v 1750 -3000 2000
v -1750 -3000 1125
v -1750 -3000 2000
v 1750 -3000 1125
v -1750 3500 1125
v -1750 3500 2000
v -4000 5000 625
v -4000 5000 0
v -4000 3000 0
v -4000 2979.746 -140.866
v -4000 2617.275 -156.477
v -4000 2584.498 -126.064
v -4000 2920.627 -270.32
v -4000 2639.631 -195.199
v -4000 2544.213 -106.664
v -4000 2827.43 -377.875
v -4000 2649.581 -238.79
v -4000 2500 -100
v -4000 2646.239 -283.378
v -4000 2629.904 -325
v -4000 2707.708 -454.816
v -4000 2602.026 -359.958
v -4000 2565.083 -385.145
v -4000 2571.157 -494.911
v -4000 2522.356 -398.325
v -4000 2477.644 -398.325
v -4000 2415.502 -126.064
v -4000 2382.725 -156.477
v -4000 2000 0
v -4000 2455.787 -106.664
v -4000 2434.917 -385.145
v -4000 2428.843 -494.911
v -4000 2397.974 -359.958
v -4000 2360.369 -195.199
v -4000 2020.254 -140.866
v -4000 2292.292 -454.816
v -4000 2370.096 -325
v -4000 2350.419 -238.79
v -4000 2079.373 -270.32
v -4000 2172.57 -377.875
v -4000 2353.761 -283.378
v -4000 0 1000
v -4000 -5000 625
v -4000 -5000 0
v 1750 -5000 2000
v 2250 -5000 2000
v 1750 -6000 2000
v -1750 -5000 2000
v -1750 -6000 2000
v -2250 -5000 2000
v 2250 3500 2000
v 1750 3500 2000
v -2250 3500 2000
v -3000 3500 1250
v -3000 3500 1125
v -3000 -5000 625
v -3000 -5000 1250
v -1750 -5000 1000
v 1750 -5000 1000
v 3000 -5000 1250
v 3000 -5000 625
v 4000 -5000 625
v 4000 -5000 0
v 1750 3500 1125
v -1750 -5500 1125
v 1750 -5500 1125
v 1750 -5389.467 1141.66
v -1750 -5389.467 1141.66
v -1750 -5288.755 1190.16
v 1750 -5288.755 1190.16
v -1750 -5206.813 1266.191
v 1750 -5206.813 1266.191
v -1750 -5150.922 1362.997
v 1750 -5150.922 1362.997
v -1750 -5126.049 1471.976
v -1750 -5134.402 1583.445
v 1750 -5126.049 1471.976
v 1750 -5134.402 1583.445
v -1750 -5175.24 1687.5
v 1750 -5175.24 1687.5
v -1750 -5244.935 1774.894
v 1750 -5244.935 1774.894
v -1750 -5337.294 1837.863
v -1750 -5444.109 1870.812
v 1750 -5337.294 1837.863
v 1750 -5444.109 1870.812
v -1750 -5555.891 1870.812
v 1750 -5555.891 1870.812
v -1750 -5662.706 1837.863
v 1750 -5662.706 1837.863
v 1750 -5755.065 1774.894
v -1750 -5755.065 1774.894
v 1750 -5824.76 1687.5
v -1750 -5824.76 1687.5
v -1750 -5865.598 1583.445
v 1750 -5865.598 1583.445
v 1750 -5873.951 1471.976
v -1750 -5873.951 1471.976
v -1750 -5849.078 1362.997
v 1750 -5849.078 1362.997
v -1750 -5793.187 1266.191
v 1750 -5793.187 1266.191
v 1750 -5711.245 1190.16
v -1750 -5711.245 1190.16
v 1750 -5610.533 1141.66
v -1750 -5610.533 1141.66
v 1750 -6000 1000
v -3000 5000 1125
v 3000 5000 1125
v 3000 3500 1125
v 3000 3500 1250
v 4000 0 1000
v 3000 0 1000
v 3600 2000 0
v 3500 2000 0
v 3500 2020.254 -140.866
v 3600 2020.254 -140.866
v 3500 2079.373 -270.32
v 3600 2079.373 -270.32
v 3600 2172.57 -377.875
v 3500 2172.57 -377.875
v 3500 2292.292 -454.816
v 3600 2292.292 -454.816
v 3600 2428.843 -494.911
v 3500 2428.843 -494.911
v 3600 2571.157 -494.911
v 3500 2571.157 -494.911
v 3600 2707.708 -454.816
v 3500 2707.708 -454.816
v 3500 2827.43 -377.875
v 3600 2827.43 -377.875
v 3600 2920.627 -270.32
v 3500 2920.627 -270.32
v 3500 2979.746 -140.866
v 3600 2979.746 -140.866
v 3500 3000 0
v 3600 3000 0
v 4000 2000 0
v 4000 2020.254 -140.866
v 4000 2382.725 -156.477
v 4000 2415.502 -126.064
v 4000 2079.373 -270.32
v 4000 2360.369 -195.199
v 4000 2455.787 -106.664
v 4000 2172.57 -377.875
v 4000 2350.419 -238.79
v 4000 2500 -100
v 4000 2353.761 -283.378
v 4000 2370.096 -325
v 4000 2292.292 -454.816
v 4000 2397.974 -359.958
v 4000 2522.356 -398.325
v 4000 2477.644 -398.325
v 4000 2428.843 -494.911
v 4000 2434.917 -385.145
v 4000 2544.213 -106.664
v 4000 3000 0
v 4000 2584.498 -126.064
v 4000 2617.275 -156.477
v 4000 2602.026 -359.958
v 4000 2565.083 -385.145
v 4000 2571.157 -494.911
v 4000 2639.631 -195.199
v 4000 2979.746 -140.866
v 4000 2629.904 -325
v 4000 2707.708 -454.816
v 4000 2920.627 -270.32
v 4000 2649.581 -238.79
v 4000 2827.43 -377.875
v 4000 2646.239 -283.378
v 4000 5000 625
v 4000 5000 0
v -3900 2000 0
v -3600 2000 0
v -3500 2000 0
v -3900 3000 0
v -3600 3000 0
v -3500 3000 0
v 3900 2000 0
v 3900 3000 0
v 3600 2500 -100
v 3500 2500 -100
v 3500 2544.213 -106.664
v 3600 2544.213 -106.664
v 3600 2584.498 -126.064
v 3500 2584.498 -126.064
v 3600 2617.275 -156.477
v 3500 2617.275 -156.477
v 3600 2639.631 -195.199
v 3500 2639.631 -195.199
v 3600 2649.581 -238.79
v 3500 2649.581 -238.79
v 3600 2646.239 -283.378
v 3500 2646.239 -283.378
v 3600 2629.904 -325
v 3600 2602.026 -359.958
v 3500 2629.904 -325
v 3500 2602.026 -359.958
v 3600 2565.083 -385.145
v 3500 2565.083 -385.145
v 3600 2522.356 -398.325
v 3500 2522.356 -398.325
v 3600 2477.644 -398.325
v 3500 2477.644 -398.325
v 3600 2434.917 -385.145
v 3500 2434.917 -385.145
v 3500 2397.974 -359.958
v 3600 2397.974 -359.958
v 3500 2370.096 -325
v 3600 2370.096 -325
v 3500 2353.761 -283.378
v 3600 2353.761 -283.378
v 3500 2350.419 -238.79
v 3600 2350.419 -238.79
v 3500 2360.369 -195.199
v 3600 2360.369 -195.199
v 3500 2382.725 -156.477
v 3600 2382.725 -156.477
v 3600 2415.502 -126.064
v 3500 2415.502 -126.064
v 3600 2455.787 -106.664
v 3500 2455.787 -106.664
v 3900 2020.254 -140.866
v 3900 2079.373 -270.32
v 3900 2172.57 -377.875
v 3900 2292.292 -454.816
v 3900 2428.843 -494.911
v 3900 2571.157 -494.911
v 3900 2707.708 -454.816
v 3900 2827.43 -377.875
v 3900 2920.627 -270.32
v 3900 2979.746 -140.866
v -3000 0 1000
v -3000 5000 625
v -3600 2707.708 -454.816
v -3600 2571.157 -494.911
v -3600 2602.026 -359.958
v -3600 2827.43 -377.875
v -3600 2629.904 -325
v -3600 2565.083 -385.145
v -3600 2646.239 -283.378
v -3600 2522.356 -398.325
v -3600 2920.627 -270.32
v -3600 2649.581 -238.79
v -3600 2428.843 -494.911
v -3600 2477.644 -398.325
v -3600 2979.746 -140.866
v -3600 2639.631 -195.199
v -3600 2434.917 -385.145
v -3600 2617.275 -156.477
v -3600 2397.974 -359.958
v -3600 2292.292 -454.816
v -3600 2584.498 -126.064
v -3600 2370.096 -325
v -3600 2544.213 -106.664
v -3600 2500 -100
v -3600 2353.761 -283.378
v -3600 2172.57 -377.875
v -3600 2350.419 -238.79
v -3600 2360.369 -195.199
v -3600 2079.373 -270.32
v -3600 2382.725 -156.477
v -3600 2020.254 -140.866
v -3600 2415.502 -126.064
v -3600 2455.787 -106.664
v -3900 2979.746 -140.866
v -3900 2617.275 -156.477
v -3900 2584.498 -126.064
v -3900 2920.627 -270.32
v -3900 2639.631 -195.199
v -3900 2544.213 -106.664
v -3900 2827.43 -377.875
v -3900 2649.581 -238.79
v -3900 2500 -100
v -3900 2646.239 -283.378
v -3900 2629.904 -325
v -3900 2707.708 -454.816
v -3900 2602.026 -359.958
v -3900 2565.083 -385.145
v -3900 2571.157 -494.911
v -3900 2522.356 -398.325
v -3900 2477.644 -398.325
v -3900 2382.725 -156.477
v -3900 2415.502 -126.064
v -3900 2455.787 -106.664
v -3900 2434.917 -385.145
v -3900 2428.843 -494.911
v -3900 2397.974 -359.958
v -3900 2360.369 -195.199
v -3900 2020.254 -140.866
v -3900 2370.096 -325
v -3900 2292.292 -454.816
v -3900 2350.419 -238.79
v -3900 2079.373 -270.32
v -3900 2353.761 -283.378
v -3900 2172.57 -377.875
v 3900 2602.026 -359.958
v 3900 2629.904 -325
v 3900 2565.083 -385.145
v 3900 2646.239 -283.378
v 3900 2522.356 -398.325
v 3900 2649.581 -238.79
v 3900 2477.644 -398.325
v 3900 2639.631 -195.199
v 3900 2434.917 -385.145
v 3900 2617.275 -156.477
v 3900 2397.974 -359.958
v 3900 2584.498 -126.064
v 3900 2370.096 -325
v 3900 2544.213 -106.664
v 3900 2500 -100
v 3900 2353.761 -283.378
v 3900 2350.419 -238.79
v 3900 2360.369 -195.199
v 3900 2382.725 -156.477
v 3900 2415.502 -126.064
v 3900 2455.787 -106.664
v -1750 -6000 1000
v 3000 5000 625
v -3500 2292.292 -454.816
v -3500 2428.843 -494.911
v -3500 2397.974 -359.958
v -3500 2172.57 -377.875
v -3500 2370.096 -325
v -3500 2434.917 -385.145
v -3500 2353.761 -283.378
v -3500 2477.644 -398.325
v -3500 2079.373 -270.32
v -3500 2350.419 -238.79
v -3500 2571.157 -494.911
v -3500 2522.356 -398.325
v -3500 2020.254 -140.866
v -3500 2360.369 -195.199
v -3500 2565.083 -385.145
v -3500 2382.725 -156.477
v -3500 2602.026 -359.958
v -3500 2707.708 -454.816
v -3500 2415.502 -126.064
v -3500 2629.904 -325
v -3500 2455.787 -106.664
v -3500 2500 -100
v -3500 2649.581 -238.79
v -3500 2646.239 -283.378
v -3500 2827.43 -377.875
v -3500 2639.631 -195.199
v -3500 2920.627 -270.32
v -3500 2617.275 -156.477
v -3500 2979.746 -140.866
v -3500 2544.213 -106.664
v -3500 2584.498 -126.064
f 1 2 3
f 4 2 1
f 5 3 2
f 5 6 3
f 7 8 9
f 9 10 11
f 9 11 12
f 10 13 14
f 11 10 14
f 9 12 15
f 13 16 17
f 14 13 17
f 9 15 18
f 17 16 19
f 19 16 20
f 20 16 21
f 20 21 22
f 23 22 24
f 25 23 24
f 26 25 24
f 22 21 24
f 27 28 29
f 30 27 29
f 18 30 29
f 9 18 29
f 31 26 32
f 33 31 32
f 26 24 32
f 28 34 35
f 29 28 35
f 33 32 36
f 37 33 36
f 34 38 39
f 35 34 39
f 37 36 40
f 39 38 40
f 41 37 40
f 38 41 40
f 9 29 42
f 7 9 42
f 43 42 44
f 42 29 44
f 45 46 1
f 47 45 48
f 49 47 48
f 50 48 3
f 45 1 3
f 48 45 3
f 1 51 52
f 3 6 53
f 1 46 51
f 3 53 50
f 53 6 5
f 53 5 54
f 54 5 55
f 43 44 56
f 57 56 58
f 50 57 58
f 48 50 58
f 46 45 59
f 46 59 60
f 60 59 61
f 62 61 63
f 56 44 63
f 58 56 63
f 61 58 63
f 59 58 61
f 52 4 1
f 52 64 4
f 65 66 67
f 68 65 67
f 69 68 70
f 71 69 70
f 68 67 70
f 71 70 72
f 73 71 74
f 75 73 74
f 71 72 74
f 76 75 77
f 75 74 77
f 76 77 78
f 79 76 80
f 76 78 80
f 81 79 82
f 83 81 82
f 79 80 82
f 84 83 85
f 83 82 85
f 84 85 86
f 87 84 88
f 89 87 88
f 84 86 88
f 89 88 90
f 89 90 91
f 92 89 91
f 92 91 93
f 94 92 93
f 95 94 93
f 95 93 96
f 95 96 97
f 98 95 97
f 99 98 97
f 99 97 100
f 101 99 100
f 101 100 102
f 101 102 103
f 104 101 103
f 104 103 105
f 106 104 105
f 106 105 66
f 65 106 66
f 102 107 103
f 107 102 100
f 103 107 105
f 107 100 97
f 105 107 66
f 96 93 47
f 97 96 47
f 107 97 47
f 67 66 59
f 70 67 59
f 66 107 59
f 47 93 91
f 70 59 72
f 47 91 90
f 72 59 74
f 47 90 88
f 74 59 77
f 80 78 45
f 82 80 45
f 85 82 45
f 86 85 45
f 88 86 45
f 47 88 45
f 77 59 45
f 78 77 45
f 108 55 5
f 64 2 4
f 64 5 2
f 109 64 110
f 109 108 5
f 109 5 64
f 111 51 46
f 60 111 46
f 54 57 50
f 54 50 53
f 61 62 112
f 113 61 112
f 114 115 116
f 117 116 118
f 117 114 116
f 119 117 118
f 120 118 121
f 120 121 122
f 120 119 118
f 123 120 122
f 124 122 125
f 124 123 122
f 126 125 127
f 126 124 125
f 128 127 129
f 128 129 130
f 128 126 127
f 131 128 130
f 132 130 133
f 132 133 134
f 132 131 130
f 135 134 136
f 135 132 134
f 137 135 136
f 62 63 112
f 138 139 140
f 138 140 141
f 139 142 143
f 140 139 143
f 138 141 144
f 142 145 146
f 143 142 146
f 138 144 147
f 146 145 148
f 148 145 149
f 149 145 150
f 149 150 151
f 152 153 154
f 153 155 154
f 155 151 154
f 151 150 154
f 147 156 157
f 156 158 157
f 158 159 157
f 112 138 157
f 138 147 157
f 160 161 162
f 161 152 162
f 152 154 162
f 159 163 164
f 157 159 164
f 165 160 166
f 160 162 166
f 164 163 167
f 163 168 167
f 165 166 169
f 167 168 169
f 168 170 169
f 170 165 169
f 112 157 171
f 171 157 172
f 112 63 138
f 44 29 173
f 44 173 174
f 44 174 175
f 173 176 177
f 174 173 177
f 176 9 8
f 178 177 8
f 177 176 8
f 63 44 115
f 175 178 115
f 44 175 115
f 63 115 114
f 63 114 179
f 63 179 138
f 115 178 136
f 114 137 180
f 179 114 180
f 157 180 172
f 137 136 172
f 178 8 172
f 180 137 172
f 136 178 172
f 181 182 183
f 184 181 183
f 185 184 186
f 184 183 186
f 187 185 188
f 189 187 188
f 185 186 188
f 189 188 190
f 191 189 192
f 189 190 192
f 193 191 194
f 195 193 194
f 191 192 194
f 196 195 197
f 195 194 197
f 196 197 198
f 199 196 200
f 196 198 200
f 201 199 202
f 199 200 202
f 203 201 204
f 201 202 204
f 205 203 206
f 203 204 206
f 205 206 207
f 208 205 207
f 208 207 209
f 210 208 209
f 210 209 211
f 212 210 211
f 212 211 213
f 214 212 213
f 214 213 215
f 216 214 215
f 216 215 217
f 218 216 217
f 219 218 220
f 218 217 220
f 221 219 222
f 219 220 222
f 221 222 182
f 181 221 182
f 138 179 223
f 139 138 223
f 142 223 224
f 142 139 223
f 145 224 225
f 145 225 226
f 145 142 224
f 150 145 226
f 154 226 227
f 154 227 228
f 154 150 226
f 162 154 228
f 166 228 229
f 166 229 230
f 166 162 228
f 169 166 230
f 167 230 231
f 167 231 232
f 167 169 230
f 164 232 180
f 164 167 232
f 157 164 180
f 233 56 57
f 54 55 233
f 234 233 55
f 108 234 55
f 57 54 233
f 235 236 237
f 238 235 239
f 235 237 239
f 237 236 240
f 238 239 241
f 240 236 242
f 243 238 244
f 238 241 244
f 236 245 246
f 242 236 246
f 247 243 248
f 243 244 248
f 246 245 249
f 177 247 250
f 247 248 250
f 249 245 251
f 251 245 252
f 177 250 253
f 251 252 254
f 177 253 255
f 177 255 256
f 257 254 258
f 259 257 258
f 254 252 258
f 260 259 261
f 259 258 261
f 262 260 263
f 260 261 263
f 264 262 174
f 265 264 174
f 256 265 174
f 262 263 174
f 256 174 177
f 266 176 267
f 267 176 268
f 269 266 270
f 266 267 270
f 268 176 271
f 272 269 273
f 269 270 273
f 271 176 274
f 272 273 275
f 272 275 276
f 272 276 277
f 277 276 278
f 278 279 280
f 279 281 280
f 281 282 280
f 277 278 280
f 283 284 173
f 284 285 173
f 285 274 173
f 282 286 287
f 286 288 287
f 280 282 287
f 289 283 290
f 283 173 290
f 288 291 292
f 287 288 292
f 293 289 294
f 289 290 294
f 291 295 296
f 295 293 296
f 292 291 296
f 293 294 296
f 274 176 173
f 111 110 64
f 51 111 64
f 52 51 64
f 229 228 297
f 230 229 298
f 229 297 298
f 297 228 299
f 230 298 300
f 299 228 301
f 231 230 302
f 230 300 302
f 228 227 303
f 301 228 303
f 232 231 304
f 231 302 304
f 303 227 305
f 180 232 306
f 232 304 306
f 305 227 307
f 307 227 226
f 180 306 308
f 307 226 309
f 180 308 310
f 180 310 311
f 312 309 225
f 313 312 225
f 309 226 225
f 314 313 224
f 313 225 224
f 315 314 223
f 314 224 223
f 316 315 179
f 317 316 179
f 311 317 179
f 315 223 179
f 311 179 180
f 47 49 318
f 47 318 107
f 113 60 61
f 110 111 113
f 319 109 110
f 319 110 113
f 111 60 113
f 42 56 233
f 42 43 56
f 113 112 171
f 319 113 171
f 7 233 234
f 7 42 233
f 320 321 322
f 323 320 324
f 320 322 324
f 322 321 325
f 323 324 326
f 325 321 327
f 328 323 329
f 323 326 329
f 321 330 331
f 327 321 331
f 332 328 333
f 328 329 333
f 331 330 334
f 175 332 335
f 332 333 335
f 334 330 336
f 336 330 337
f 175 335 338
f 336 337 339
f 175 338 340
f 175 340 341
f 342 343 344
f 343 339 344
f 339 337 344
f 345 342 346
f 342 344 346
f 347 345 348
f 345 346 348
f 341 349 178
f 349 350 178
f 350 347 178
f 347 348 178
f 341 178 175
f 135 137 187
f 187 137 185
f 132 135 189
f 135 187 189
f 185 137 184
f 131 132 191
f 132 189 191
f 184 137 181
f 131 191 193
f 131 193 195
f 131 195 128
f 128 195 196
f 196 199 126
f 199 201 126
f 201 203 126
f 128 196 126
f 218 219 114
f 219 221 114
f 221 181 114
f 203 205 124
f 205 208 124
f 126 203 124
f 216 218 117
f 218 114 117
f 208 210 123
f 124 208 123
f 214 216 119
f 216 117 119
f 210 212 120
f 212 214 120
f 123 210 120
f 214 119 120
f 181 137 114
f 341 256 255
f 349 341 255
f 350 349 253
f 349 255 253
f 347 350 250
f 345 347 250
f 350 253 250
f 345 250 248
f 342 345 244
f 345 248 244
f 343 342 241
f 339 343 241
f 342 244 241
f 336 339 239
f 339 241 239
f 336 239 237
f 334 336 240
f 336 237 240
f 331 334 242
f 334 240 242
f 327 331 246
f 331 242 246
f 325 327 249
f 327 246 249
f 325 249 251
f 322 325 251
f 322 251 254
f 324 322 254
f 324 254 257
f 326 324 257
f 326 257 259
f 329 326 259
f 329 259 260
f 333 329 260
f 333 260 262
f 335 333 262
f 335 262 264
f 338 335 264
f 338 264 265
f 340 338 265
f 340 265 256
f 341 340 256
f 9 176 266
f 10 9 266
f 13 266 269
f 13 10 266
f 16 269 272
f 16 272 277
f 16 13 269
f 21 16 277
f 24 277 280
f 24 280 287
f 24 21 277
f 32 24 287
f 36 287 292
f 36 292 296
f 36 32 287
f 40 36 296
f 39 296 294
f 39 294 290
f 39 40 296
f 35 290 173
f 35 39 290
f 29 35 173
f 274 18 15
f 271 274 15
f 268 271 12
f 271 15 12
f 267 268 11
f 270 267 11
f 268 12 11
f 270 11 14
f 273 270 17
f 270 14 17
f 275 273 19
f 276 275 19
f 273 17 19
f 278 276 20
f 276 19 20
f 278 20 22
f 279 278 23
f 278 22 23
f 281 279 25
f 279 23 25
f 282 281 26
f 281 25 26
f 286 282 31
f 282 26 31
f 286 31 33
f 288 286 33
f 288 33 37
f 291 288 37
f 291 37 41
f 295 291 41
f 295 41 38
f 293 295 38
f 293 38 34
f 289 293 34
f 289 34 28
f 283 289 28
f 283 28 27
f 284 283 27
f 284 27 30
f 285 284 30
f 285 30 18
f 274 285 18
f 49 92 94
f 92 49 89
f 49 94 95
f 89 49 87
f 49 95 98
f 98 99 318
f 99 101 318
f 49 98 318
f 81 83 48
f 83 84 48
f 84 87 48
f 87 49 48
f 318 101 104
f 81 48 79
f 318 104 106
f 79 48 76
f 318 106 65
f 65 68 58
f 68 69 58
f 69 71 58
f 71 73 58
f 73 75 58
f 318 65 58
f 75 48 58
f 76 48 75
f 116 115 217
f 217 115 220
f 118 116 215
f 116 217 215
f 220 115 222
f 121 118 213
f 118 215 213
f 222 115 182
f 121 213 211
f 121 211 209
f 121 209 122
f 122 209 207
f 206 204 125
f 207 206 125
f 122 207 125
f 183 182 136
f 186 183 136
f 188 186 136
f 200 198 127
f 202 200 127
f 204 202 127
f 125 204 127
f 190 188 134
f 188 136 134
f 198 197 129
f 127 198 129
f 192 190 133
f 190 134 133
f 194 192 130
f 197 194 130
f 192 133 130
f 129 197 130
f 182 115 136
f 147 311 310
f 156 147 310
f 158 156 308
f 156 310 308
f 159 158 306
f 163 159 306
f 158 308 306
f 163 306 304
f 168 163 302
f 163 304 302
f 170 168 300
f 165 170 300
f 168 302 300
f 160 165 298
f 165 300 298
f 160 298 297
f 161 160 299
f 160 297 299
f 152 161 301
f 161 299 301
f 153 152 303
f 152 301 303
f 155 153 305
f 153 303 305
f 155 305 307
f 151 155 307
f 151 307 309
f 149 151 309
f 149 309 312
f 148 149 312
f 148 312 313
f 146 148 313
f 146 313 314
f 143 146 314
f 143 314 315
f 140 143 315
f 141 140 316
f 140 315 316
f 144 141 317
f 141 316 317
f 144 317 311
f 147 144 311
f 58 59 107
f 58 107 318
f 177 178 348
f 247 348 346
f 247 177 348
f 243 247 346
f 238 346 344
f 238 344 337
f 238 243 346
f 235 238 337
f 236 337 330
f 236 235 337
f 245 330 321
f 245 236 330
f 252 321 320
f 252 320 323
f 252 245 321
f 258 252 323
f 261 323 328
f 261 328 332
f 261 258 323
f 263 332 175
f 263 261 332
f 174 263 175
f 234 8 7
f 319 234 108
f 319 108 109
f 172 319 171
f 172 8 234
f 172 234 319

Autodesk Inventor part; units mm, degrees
ref_plane "YZ Plane" through (0, 0, 0) normal (1, 0, 0) x (0, 1, 0)
sketch "Skizze1" plane through (0, 0, 0) normal (0, 0, 1) x (1, 0, 0)
  line L0 (-5600, 0) -> (5600, 0) construction
  line L1 (0, -7000) -> (0, 7000) construction
  line L2 (-4000, -5000) -> (4000, -5000)
  line L3 (4000, -5000) -> (4000, 5000)
  line L4 (4000, 5000) -> (-4000, 5000)
  line L5 (-4000, 5000) -> (-4000, -5000)
  line L6 (-4000, -5000) -> (4000, 5000) construction
  line L7 (4000, -5000) -> (-4000, 5000) construction
  point P0 (0, 0)
  dimension "d0" = 8000
  dimension "d1" = 10000
extrude "Extrusion1" add sketch "Skizze1" along normal blind 2000
sketch "Skizze2" plane through (-4000, 5000, 0) normal (0, 1, 0) x (1, 0, 0)
  line L0 (0, 0) -> (0, -1250)
  line L1 (0, -1250) -> (0, 0)
  line L2 (0, -1250) -> (1000, -1250)
  line L3 (8000, 0) -> (8000, -2000) construction
  line L4 (0, 0) -> (0, -2000) projected
  line L5 (1000, -1250) -> (1000, -2000)
  line L6 (8000, -2000) -> (0, -2000) construction
  line L7 (1000, -2000) -> (4000, -2000)
  line L8 (8000, 0) -> (8000, -1250)
  line L9 (8000, -1250) -> (7000, -1250)
  line L10 (7000, -1250) -> (7000, -2000)
  line L11 (8000, 0) -> (0, 0) projected
  line L12 (8000, 0) -> (0, 0)
  line L13 (7000, -2000) -> (4000, -2000)
  line L14 (0, -1250) -> (0, -2000)
  line L15 (0, -2000) -> (1000, -2000)
  line L16 (8000, -1250) -> (8000, -2000)
  line L17 (7000, -2000) -> (8000, -2000)
  line L18 (8000, -2000) -> (8000, -1250)
  point P0 (4000, 0)
  dimension "d4" = 750
  dimension "d5" = 1250
  dimension "d7" = 1000
extrude "Extrusion2" cut sketch "Skizze2" against normal through all contours L2 L5 L15 L4 | L16 L17 L10 L9
chamfer "Fase1" distance 750 angle 45 2 edges at (-3000, 0, 2000) (3000, 0, 2000)
sketch "Skizze3" plane through (4000, -5000, 0) normal (1, 0, 0) x (0, 0, -1)
  line L0 (0, 10000) -> (0, 8000)
  arc A0 (0, 7000) -> (0, 8000) centre (0, 7500) ccw
  line L1 (0, 7000) -> (0, 0)
  line L2 (0, 8000) -> (0, 7000)
  line L3 (0, 0) -> (0, 10000) projected
  point P0 (0, 5000)
  dimension "d16" = 2000
  dimension "d17" = 7000
extrude "Extrusion3" add sketch "Skizze3" against normal blind 500
sketch "Skizze4" plane through (0, 0, 0) normal (0, 0, -1) x (-1, 0, 0)
  point P0 (0, 0)
sketch "Skizze5" plane through (-4000, -5000, 0) normal (-1, 0, 0) x (0, 0, 1)
  line L0 (0, 8000) -> (0, 7000) projected
  arc A0 (0, 8000) -> (0, 7000) centre (0, 7500) ccw
  line L1 (0, 7000) -> (0, 8000)
  point P0 (0, 5000)
extrude "Extrusion4" add sketch "Skizze5" against normal blind 500
ref_plane "Arbeitsebene1" through (4000, 2000, 0) normal (0, 1, 0) x (1, 0, 0)
sketch "Skizze6" plane through (4000, 2000, 0) normal (0, 1, 0) x (1, 0, 0)
  line L0 (-100, 0) -> (-400, 0)
  line L1 (0, 0) -> (0, -1250) projected
  line L2 (-7900, 0) -> (-7600, 0)
  line L3 (0, 500) -> (-500, 500) projected
  line L4 (-100, 0) -> (-400, 0)
  line L5 (-400, 0) -> (-400, 500)
  line L6 (-400, 500) -> (-100, 500)
  line L7 (-100, 500) -> (-100, 0)
  line L8 (-8000, 500) -> (-7500, 500) construction
  line L9 (-7600, 0) -> (-7900, 0)
  line L10 (-7900, 0) -> (-7900, 500)
  line L11 (-7900, 500) -> (-7600, 500)
  line L12 (-7600, 500) -> (-7600, 0)
  point P0 (-4000, 0)
  point P1 (-8000, 0)
  dimension "d22" = 300
  dimension "d23" = 100
  dimension "d25" = 300
extrude "Extrusion5" cut sketch "Skizze6" along normal through all
sketch "Skizze7" plane through (0, 0, 2000) normal (0, 0, 1) x (1, 0, 0)
  line L0 (-2250, -5000) -> (2250, -5000) construction
  line L1 (-1750, 5000) -> (1750, 5000)
  line L2 (1750, 5000) -> (1750, -5000)
  line L3 (1750, -5000) -> (-1750, -5000)
  line L4 (-1750, -5000) -> (-1750, 5000)
  line L5 (-1750, 5000) -> (1750, -5000) construction
  line L6 (1750, 5000) -> (-1750, -5000) construction
  point P0 (0, 0)
  dimension "d28" = 3500
extrude "Extrusion6" cut sketch "Skizze7" against normal blind 1000
sketch "Skizze8" plane through (-4000, -5000, 1250) normal (-1, 0, 0) x (0, 0, 1)
  line L0 (-1250, 0) -> (0, 0) projected
  line L1 (-625, 0) -> (-250, 5000)
  line L2 (-250, 10000) -> (-250, 0) projected
  line L3 (-250, 5000) -> (-625, 10000)
  line L4 (-1250, 10000) -> (0, 10000) projected
  line L5 (-1250, 7000) -> (-1250, 0) construction
  line L6 (0, 10000) -> (0, 0) projected
  line L7 (-1250, 0) -> (0, 0)
  line L8 (750, 10000) -> (0, 10000) construction
  line L9 (0, 0) -> (0, 10000)
  line L10 (0, 10000) -> (-1250, 10000)
  line L11 (-250, 0) -> (-250, 10000)
  point P0 (-1250, 5000)
extrude "Extrusion7" cut sketch "Skizze8" against normal blind 1000 contours L1 L2 L0 | L3 L4 L2
sketch "Skizze9" plane through (-4000, -5000, 1250) normal (-1, 0, 0) x (0, 0, 1)
  line L0 (0, 0) -> (0, 10000) projected
  line L1 (-250, 0) -> (0, 0)
  line L2 (0, 0) -> (0, 10000)
  line L3 (0, 10000) -> (-250, 10000)
  line L4 (-250, 10000) -> (-250, 0)
  point P0 (-1250, 5000)
extrude "Extrusion8" cut sketch "Skizze9" against normal blind 1000
sketch "Skizze10" plane through (4000, -5000, 1250) normal (1, 0, 0) x (0, 0, -1)
  line L0 (250, 5000) -> (625, 10000) projected
  line L1 (625, 0) -> (250, 5000) projected
  line L2 (625, 10000) -> (250, 5000)
  line L3 (250, 5000) -> (625, 0)
  line L4 (1250, 0) -> (0, 0) construction
  line L5 (625, 10000) -> (1250, 10000)
  line L6 (1250, 10000) -> (0, 10000) projected
  line L7 (625, 10000) -> (0, 10000)
  line L8 (0, 10000) -> (0, 0) projected
  line L9 (0, 10000) -> (0, 0)
  line L10 (0, 0) -> (625, 0)
  point P0 (1250, 5000)
extrude "Extrusion9" cut sketch "Skizze10" against normal blind 1000
sketch "Skizze11" plane through (-4000, -5000, 0) normal (-1, 0, 0) x (0, 0, 1)
  circle A0 centre (-250, 7500) radius 150
  point P0 (0, 5000)
  dimension "d37" = 300
extrude "Extrusion10" cut sketch "Skizze11" against normal through all
sketch "Skizze12" plane through (-4000, -5000, 0) normal (0, -1, 0) x (1, 0, 0)
  line L0 (5750, 1000) -> (5750, 2000) projected
  line L1 (5750, 1000) -> (2250, 1000) projected
  line L2 (5750, 2000) -> (2250, 2000)
  line L3 (2250, 2000) -> (2250, 1000)
  line L4 (2250, 1000) -> (5750, 1000)
  line L5 (5750, 1000) -> (5750, 2000)
  point P0 (4000, 0)
extrude "Extrusion11" add sketch "Skizze12" along normal blind 1000
sketch "Skizze13" plane through (-4000, 5000, 0) normal (0, 1, 0) x (1, 0, 0)
  line L0 (5750, -2000) -> (2250, -2000) projected
  line L1 (2250, -1000) -> (5750, -1000) projected
  line L2 (2250, -2000) -> (5750, -2000)
  line L3 (5750, -2000) -> (5750, -1000)
  line L4 (5750, -1000) -> (2250, -1000)
  line L5 (2250, -1000) -> (2250, -2000)
  point P0 (4000, 0)
extrude "Extrusion12" add sketch "Skizze13" against normal blind 10000
sketch "Skizze14" plane through (1750, -5000, 2000) normal (1, 0, 0) x (0, 0, -1)
  line L0 (1000, -1000) -> (0, -1000) construction
  line L1 (0, 0) -> (0, -1000) construction
  circle A0 centre (500, -500) radius 375
  point P0 (2000, 5000)
  dimension "d44" = 750
extrude "Extrusion13" cut sketch "Skizze14" against normal blind 10000
sketch "Skizze15" plane through (4000, -5000, 0) normal (1, 0, 0) x (0, 0, -1)
  point P0 (0, 5000)
sketch "Skizze16" plane through (4000, -5000, 0) normal (1, 0, 0) x (0, 0, -1)
  point P0 (0, 5000)
sketch "Skizze17" plane through (-4000, 5000, 0) normal (0, 1, 0) x (1, 0, 0)
  line L0 (5750, -1125) -> (2250, -1125) projected
  line L1 (5750, -1000) -> (5750, -2000) projected
  line L2 (2250, -1125) -> (5750, -1125)
  line L3 (5750, -1125) -> (5750, -2000)
  line L4 (5750, -2000) -> (2250, -2000)
  line L5 (2250, -2000) -> (2250, -1125)
  point P0 (4000, 0)
extrude "Extrusion14" cut sketch "Skizze17" against normal blind 8000
ref_plane "Arbeitsebene2" through (2000, 5000, 2000) normal (0, 0, 1) x (1, 0, 0)
sketch "Skizze18" plane through (-1750, 5000, 1125) normal (0, 0, 1) x (1, 0, 0)
  line L0 (4750, 0) -> (4750, -10000) projected
  line L1 (-1250, 0) -> (4750, 0)
  line L2 (4750, 0) -> (4750, -1500)
  line L3 (4750, -1500) -> (-1250, -1500)
  line L4 (-1250, -1500) -> (-1250, 0)
  line L5 (-500, 0) -> (-1250, 0) projected
  line L6 (-1250, 0) -> (4750, 0)
  line L7 (4750, 0) -> (4750, -1500)
  line L8 (4750, -1500) -> (-1250, -1500)
  line L9 (-1250, -1500) -> (-1250, 0)
  point P0 (1750, -5000)
  dimension "d49" = 1500
extrude "Extrusion15" cut sketch "Skizze18" along normal blind 2000
properties part number "Hebeteil" material "Acetalharz, Weiß"
